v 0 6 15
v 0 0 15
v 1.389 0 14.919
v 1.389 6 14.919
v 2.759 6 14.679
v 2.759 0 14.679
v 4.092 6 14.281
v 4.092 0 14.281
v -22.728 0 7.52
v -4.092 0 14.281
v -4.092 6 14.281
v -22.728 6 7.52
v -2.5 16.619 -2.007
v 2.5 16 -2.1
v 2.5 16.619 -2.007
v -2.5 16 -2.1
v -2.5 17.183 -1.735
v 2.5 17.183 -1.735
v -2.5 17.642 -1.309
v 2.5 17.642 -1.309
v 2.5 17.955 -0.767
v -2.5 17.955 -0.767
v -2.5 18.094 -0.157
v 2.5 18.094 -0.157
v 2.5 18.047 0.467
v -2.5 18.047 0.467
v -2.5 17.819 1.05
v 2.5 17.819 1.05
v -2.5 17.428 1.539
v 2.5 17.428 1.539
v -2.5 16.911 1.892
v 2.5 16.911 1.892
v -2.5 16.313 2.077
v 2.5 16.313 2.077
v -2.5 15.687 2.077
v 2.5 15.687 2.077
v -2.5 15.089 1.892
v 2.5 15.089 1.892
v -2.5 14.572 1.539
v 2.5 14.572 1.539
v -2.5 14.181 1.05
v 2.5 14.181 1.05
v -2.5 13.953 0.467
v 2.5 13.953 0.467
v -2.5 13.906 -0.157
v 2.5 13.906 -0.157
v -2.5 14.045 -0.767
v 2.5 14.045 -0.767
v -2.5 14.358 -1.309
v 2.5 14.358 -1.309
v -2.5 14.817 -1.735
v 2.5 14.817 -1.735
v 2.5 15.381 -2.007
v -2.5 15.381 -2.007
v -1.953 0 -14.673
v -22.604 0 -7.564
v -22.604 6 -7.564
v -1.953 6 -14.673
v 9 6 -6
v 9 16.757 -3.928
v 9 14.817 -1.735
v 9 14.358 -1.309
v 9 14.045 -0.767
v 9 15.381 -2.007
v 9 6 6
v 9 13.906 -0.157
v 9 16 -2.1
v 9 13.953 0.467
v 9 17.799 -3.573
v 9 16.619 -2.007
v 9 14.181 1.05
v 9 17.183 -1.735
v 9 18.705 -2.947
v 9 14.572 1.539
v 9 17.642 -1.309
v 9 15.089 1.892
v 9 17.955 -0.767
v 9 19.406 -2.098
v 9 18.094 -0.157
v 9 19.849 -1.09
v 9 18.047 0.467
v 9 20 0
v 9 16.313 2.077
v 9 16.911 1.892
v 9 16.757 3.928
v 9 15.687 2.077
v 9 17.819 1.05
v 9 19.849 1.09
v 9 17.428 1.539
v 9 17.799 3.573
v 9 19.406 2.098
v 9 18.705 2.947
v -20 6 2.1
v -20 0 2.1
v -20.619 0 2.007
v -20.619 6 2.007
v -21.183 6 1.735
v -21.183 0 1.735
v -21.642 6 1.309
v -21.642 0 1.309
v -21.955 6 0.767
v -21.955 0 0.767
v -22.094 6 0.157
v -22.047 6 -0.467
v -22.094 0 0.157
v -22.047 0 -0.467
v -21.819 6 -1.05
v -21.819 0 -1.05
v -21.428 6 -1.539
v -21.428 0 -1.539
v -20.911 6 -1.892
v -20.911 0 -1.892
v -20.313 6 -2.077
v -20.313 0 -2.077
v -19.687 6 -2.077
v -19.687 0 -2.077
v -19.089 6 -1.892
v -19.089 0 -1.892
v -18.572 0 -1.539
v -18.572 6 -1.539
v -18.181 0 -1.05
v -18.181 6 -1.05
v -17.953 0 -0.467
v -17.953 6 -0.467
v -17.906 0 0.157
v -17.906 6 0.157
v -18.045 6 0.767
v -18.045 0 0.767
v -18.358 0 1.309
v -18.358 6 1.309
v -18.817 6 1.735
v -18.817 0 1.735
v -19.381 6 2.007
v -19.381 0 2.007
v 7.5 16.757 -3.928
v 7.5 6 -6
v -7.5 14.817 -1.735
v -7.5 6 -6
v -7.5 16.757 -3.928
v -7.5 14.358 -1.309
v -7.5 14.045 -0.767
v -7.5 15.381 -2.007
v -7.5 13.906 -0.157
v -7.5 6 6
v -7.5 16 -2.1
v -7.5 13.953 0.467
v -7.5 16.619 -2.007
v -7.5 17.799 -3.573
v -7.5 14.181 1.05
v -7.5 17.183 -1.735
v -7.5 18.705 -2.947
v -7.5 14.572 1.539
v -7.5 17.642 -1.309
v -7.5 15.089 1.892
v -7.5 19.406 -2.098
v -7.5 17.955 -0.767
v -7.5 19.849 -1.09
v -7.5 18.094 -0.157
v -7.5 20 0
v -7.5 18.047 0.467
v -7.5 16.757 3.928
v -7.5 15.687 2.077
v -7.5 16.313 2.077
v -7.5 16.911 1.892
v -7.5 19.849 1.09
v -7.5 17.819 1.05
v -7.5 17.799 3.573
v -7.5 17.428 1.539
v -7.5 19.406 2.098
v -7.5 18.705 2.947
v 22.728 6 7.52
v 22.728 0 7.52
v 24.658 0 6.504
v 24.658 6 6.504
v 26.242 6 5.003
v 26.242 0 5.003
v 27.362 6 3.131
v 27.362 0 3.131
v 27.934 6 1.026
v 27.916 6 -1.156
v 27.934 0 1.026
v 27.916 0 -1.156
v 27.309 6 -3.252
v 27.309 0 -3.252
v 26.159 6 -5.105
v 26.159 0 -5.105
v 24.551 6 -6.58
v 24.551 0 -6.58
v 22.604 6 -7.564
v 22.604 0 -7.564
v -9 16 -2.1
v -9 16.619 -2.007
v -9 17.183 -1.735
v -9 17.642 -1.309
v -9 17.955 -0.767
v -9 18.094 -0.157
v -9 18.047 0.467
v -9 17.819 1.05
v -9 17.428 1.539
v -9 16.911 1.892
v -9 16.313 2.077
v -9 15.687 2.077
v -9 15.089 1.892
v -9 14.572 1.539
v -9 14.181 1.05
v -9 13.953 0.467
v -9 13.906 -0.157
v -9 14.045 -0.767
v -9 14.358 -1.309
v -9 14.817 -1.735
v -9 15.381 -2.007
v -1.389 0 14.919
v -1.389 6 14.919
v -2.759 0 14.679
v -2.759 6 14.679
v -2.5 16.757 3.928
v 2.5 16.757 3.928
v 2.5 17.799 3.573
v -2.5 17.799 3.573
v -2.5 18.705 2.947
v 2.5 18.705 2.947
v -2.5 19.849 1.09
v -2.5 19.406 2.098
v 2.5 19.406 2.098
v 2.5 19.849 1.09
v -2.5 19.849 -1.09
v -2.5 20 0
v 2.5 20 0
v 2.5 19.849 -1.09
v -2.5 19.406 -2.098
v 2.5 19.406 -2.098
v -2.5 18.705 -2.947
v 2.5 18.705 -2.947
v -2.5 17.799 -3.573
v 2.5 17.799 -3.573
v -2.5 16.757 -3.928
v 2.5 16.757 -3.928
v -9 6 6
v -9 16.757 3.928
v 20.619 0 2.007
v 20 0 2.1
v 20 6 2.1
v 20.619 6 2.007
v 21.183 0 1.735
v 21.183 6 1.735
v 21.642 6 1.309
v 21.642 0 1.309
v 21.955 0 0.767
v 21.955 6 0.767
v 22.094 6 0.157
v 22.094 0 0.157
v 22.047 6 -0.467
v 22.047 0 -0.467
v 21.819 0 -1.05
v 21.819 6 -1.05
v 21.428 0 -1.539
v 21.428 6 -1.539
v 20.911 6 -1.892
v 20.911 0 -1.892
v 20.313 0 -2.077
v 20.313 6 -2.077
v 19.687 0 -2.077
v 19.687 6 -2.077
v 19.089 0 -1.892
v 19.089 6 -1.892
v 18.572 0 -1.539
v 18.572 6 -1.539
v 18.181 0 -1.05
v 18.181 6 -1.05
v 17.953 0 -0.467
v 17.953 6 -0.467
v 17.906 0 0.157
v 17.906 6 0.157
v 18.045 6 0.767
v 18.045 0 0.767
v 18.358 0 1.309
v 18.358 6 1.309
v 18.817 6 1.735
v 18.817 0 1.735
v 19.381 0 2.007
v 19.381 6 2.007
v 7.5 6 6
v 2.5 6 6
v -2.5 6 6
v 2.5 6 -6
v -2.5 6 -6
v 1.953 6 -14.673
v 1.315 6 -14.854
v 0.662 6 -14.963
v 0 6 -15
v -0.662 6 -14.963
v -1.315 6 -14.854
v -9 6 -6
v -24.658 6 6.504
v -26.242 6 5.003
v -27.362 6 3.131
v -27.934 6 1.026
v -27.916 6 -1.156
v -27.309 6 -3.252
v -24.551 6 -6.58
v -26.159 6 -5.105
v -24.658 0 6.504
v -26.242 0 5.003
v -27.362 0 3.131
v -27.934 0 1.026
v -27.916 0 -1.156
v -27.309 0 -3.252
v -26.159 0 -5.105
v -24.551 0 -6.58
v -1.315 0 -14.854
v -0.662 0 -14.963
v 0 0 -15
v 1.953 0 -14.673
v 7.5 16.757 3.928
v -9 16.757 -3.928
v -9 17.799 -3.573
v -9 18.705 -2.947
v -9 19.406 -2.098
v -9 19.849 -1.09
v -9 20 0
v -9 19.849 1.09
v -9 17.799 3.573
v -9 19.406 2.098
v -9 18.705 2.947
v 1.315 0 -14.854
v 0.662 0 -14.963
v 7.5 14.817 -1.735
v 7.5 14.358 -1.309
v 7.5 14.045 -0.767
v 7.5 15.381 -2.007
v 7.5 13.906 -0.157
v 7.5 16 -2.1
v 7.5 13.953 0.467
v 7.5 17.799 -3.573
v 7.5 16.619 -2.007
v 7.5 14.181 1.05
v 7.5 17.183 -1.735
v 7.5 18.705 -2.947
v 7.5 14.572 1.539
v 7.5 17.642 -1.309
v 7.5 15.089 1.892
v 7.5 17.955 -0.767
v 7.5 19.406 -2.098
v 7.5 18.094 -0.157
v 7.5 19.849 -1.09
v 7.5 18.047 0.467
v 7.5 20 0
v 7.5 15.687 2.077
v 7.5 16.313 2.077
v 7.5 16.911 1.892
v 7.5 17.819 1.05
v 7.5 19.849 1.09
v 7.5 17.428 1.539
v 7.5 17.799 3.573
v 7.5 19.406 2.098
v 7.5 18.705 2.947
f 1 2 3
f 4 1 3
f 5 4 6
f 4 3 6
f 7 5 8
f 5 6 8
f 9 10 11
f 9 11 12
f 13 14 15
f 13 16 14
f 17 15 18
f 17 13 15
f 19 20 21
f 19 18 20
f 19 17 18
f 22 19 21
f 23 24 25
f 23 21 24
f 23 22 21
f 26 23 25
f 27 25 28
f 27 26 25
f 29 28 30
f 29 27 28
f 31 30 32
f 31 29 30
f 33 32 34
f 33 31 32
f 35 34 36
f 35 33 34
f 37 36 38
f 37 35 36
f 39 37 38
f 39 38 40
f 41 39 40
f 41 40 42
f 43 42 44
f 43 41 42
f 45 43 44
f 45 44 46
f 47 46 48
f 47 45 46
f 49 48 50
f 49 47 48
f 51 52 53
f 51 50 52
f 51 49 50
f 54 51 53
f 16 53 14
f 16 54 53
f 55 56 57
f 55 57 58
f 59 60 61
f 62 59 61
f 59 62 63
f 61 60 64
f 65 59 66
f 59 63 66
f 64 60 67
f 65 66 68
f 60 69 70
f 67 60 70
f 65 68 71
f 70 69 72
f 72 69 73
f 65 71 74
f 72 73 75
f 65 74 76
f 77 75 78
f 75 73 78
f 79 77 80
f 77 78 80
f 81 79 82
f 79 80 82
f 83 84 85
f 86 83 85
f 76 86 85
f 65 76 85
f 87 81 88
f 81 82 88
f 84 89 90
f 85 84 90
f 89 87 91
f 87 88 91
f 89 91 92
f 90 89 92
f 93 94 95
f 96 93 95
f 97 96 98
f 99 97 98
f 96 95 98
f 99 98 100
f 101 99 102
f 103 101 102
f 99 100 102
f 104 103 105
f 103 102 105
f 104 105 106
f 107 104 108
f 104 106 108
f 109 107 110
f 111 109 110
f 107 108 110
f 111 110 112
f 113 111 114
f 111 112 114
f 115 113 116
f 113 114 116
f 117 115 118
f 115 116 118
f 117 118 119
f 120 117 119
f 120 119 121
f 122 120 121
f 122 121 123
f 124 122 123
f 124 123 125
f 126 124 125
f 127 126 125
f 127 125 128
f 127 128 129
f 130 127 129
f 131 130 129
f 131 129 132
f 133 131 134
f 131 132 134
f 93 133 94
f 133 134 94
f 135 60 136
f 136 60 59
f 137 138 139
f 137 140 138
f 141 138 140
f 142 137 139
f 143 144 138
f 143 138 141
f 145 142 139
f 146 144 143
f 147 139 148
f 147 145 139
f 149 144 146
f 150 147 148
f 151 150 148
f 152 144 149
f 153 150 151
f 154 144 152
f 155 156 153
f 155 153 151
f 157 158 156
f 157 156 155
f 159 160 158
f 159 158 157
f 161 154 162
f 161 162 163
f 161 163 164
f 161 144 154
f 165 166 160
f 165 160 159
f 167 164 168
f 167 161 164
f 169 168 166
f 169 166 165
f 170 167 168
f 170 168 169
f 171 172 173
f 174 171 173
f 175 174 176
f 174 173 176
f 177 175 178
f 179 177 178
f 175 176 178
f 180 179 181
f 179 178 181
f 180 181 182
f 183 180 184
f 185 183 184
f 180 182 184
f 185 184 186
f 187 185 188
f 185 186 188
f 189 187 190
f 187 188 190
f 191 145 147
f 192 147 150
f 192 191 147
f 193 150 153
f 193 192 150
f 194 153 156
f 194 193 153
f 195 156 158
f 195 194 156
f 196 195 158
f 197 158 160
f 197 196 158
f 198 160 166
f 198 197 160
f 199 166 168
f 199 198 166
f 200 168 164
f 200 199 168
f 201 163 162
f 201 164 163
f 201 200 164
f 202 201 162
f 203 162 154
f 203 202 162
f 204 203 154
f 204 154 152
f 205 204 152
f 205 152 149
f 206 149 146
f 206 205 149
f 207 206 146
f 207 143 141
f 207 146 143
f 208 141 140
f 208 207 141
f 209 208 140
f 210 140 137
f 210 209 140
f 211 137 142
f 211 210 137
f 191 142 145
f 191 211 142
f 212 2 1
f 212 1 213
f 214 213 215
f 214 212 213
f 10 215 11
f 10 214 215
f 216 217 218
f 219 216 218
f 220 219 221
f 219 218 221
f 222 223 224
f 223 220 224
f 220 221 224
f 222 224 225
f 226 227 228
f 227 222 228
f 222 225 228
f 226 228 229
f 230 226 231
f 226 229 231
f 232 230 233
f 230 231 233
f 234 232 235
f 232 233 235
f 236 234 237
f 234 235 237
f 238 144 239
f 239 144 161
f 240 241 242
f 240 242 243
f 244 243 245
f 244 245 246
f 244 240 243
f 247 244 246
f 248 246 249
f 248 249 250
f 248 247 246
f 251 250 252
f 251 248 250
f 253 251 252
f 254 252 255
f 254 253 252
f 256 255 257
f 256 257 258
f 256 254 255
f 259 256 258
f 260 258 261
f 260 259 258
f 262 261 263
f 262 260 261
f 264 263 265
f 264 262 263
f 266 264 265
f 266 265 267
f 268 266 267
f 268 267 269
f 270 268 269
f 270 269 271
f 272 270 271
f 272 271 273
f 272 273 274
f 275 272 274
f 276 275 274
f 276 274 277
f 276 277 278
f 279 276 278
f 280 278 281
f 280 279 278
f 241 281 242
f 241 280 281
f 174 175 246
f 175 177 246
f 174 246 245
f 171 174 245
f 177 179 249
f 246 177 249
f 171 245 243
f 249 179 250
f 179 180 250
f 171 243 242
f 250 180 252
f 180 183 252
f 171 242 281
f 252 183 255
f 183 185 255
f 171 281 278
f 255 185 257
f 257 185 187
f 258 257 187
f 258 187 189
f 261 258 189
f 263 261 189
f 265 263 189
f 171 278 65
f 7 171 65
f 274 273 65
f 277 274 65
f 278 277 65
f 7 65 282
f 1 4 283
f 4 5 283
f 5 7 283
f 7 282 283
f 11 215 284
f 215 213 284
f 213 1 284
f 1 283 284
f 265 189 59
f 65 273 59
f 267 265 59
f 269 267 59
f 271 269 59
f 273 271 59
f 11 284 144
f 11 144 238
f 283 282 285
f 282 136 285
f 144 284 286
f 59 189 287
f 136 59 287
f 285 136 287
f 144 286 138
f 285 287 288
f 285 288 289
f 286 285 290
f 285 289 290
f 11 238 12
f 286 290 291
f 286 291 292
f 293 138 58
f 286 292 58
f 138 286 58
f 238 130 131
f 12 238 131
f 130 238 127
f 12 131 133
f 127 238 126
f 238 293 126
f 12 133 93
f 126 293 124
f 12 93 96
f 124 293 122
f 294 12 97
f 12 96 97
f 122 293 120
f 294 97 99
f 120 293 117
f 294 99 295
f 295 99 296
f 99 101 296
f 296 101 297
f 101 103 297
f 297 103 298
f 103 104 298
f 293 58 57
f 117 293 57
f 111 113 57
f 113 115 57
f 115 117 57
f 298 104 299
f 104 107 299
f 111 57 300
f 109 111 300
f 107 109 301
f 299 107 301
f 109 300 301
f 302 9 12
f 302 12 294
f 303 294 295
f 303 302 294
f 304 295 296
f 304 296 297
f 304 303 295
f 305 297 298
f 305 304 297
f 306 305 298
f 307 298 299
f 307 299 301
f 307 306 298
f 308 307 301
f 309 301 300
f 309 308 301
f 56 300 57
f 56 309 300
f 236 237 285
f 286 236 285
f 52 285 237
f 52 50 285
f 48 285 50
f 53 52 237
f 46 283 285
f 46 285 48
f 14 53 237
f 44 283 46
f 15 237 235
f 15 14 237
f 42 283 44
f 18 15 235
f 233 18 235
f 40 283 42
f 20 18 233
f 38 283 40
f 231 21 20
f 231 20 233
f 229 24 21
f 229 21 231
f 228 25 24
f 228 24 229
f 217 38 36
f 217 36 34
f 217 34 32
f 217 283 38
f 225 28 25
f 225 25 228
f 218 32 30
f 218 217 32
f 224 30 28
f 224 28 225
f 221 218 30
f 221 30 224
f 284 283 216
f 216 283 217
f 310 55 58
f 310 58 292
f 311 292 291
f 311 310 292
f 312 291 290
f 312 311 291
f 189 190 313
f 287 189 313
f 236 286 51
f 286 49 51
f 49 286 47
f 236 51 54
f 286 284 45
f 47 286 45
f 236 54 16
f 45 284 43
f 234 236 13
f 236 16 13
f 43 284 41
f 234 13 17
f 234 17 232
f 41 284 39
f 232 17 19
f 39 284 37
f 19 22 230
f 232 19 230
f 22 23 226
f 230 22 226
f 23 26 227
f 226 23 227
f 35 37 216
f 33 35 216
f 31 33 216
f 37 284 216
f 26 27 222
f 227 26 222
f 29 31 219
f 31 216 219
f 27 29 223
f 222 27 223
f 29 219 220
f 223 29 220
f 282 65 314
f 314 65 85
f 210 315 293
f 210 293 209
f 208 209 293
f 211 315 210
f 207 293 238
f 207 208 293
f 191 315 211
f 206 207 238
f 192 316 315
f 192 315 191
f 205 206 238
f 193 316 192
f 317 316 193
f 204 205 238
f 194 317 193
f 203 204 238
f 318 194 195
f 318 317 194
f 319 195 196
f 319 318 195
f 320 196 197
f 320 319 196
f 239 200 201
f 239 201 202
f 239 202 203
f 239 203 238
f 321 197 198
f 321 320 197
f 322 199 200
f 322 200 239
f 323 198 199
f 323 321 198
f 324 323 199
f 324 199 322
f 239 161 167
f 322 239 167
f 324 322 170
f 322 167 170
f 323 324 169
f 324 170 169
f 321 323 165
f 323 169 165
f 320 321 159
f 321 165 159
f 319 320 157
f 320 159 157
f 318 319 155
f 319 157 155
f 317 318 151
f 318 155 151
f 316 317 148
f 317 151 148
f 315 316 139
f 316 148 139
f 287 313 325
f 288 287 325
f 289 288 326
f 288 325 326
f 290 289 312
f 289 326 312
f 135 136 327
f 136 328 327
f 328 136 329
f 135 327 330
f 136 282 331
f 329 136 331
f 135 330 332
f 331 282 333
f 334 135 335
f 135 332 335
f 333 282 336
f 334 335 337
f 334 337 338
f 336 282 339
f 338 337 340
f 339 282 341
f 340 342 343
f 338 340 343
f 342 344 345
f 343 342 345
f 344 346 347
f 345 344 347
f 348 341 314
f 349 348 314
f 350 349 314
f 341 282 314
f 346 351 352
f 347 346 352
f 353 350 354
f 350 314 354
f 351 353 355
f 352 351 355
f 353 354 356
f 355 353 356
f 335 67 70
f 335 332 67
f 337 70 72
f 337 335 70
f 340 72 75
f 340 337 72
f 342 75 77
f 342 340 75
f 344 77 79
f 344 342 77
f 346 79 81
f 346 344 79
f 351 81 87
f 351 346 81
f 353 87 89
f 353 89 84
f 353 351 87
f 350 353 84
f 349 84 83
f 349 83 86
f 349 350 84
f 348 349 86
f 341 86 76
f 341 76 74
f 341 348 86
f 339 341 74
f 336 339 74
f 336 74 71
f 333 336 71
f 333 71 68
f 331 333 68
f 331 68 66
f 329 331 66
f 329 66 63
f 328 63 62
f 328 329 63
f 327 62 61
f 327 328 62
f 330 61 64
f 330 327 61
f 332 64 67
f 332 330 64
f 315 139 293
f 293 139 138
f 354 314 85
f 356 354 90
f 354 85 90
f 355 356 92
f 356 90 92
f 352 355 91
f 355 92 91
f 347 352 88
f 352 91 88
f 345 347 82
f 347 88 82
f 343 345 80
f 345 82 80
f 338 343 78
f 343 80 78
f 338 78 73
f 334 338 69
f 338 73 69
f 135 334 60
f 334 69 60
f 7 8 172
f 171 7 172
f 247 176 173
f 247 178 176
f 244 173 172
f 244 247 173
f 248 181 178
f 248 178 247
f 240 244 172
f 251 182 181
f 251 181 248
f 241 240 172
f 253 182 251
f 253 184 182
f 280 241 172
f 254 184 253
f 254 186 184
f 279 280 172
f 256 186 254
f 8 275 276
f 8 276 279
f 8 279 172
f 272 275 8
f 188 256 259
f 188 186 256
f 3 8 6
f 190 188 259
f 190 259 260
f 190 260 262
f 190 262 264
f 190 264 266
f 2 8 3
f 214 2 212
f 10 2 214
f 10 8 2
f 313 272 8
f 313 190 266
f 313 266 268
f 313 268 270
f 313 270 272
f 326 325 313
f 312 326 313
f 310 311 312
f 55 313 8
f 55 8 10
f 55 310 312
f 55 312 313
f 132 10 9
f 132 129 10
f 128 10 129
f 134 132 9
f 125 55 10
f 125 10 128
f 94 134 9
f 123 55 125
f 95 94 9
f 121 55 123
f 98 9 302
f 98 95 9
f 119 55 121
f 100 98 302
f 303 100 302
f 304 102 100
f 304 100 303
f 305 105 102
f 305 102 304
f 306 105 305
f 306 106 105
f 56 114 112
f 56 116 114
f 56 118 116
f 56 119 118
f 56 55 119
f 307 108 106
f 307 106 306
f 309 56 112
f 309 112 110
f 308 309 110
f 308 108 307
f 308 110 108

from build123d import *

# Parameters (mm, degrees)
SKETCH1_R           = 2.1
BOSS_EXTRUDE1_DEPTH = 6
SKETCH2_R           = 2.1
BOSS_EXTRUDE2_DEPTH = 9
SKETCH3_W           = 5
SKETCH3_H           = 28
CUT_EXTRUDE1_DEPTH  = 38.536648758


with BuildPart() as part:
    # Sketch1 → Boss-Extrude1 (new body)
    with BuildSketch(Plane(origin=(0, 0, 0), x_dir=(1, 0, 0), z_dir=(0, 1, 0))):
        with BuildLine():
            Line((22.603957871, 7.564350825), (1.952968403, 14.673263119))
            ThreePointArc((1.952968403, 14.673263119), (0.990055879, 14.917752053), (0, 15))
            Line((0, 15), (0, -15))
            ThreePointArc((0, -15), (2.077420969, -14.818812213), (4.092108053, -14.280720353))
            Line((4.092108053, -14.280720353), (22.728072035, -7.520480235))
            ThreePointArc((22.728072035, -7.520480235), (27.999729231, 0.065819743), (22.603957871, 7.564350825))
        make_face()
        with Locations(Location((20, 0, 0), (0, 0, 270))):
            Circle(SKETCH1_R, mode=Mode.SUBTRACT)
    boss_extrude1 = extrude(amount=BOSS_EXTRUDE1_DEPTH)

    # Mirror1: Boss-Extrude1 across plane
    add(boss_extrude1.mirror(Plane(origin=(0, 6, -15), x_dir=(0, 0, 1), z_dir=(1, 0, 0))))

    # Sketch2 → Boss-Extrude2 (add, symmetric)
    with BuildSketch(Plane(origin=(0, 0, 0), x_dir=(0, 0, -1), z_dir=(1, 0, 0))):
        with BuildLine():
            Line((-6, 6), (-3.92777975, 16.75666785))
            ThreePointArc((-3.92777975, 16.75666785), (0, 20), (3.92777975, 16.75666785))
            Line((3.92777975, 16.75666785), (6, 6))
            Line((6, 6), (-6, 6))
        make_face()
        with Locations((0, 16)):
            Circle(SKETCH2_R, mode=Mode.SUBTRACT)
    extrude(amount=BOSS_EXTRUDE2_DEPTH, both=True)

    # Sketch3 → Cut-Extrude1 (cut, symmetric)
    with BuildSketch(Plane.XY):
        with Locations((-5, 20)):
            Rectangle(SKETCH3_W, SKETCH3_H)
    cut_extrude1 = extrude(amount=CUT_EXTRUDE1_DEPTH, both=True, mode=Mode.SUBTRACT)

    # Mirror2: Cut-Extrude1 across plane
    add(cut_extrude1.mirror(Plane(origin=(0, 0, 0), x_dir=(0, 0, 1), z_dir=(1, 0, 0))), mode=Mode.SUBTRACT)


solid = part.part
